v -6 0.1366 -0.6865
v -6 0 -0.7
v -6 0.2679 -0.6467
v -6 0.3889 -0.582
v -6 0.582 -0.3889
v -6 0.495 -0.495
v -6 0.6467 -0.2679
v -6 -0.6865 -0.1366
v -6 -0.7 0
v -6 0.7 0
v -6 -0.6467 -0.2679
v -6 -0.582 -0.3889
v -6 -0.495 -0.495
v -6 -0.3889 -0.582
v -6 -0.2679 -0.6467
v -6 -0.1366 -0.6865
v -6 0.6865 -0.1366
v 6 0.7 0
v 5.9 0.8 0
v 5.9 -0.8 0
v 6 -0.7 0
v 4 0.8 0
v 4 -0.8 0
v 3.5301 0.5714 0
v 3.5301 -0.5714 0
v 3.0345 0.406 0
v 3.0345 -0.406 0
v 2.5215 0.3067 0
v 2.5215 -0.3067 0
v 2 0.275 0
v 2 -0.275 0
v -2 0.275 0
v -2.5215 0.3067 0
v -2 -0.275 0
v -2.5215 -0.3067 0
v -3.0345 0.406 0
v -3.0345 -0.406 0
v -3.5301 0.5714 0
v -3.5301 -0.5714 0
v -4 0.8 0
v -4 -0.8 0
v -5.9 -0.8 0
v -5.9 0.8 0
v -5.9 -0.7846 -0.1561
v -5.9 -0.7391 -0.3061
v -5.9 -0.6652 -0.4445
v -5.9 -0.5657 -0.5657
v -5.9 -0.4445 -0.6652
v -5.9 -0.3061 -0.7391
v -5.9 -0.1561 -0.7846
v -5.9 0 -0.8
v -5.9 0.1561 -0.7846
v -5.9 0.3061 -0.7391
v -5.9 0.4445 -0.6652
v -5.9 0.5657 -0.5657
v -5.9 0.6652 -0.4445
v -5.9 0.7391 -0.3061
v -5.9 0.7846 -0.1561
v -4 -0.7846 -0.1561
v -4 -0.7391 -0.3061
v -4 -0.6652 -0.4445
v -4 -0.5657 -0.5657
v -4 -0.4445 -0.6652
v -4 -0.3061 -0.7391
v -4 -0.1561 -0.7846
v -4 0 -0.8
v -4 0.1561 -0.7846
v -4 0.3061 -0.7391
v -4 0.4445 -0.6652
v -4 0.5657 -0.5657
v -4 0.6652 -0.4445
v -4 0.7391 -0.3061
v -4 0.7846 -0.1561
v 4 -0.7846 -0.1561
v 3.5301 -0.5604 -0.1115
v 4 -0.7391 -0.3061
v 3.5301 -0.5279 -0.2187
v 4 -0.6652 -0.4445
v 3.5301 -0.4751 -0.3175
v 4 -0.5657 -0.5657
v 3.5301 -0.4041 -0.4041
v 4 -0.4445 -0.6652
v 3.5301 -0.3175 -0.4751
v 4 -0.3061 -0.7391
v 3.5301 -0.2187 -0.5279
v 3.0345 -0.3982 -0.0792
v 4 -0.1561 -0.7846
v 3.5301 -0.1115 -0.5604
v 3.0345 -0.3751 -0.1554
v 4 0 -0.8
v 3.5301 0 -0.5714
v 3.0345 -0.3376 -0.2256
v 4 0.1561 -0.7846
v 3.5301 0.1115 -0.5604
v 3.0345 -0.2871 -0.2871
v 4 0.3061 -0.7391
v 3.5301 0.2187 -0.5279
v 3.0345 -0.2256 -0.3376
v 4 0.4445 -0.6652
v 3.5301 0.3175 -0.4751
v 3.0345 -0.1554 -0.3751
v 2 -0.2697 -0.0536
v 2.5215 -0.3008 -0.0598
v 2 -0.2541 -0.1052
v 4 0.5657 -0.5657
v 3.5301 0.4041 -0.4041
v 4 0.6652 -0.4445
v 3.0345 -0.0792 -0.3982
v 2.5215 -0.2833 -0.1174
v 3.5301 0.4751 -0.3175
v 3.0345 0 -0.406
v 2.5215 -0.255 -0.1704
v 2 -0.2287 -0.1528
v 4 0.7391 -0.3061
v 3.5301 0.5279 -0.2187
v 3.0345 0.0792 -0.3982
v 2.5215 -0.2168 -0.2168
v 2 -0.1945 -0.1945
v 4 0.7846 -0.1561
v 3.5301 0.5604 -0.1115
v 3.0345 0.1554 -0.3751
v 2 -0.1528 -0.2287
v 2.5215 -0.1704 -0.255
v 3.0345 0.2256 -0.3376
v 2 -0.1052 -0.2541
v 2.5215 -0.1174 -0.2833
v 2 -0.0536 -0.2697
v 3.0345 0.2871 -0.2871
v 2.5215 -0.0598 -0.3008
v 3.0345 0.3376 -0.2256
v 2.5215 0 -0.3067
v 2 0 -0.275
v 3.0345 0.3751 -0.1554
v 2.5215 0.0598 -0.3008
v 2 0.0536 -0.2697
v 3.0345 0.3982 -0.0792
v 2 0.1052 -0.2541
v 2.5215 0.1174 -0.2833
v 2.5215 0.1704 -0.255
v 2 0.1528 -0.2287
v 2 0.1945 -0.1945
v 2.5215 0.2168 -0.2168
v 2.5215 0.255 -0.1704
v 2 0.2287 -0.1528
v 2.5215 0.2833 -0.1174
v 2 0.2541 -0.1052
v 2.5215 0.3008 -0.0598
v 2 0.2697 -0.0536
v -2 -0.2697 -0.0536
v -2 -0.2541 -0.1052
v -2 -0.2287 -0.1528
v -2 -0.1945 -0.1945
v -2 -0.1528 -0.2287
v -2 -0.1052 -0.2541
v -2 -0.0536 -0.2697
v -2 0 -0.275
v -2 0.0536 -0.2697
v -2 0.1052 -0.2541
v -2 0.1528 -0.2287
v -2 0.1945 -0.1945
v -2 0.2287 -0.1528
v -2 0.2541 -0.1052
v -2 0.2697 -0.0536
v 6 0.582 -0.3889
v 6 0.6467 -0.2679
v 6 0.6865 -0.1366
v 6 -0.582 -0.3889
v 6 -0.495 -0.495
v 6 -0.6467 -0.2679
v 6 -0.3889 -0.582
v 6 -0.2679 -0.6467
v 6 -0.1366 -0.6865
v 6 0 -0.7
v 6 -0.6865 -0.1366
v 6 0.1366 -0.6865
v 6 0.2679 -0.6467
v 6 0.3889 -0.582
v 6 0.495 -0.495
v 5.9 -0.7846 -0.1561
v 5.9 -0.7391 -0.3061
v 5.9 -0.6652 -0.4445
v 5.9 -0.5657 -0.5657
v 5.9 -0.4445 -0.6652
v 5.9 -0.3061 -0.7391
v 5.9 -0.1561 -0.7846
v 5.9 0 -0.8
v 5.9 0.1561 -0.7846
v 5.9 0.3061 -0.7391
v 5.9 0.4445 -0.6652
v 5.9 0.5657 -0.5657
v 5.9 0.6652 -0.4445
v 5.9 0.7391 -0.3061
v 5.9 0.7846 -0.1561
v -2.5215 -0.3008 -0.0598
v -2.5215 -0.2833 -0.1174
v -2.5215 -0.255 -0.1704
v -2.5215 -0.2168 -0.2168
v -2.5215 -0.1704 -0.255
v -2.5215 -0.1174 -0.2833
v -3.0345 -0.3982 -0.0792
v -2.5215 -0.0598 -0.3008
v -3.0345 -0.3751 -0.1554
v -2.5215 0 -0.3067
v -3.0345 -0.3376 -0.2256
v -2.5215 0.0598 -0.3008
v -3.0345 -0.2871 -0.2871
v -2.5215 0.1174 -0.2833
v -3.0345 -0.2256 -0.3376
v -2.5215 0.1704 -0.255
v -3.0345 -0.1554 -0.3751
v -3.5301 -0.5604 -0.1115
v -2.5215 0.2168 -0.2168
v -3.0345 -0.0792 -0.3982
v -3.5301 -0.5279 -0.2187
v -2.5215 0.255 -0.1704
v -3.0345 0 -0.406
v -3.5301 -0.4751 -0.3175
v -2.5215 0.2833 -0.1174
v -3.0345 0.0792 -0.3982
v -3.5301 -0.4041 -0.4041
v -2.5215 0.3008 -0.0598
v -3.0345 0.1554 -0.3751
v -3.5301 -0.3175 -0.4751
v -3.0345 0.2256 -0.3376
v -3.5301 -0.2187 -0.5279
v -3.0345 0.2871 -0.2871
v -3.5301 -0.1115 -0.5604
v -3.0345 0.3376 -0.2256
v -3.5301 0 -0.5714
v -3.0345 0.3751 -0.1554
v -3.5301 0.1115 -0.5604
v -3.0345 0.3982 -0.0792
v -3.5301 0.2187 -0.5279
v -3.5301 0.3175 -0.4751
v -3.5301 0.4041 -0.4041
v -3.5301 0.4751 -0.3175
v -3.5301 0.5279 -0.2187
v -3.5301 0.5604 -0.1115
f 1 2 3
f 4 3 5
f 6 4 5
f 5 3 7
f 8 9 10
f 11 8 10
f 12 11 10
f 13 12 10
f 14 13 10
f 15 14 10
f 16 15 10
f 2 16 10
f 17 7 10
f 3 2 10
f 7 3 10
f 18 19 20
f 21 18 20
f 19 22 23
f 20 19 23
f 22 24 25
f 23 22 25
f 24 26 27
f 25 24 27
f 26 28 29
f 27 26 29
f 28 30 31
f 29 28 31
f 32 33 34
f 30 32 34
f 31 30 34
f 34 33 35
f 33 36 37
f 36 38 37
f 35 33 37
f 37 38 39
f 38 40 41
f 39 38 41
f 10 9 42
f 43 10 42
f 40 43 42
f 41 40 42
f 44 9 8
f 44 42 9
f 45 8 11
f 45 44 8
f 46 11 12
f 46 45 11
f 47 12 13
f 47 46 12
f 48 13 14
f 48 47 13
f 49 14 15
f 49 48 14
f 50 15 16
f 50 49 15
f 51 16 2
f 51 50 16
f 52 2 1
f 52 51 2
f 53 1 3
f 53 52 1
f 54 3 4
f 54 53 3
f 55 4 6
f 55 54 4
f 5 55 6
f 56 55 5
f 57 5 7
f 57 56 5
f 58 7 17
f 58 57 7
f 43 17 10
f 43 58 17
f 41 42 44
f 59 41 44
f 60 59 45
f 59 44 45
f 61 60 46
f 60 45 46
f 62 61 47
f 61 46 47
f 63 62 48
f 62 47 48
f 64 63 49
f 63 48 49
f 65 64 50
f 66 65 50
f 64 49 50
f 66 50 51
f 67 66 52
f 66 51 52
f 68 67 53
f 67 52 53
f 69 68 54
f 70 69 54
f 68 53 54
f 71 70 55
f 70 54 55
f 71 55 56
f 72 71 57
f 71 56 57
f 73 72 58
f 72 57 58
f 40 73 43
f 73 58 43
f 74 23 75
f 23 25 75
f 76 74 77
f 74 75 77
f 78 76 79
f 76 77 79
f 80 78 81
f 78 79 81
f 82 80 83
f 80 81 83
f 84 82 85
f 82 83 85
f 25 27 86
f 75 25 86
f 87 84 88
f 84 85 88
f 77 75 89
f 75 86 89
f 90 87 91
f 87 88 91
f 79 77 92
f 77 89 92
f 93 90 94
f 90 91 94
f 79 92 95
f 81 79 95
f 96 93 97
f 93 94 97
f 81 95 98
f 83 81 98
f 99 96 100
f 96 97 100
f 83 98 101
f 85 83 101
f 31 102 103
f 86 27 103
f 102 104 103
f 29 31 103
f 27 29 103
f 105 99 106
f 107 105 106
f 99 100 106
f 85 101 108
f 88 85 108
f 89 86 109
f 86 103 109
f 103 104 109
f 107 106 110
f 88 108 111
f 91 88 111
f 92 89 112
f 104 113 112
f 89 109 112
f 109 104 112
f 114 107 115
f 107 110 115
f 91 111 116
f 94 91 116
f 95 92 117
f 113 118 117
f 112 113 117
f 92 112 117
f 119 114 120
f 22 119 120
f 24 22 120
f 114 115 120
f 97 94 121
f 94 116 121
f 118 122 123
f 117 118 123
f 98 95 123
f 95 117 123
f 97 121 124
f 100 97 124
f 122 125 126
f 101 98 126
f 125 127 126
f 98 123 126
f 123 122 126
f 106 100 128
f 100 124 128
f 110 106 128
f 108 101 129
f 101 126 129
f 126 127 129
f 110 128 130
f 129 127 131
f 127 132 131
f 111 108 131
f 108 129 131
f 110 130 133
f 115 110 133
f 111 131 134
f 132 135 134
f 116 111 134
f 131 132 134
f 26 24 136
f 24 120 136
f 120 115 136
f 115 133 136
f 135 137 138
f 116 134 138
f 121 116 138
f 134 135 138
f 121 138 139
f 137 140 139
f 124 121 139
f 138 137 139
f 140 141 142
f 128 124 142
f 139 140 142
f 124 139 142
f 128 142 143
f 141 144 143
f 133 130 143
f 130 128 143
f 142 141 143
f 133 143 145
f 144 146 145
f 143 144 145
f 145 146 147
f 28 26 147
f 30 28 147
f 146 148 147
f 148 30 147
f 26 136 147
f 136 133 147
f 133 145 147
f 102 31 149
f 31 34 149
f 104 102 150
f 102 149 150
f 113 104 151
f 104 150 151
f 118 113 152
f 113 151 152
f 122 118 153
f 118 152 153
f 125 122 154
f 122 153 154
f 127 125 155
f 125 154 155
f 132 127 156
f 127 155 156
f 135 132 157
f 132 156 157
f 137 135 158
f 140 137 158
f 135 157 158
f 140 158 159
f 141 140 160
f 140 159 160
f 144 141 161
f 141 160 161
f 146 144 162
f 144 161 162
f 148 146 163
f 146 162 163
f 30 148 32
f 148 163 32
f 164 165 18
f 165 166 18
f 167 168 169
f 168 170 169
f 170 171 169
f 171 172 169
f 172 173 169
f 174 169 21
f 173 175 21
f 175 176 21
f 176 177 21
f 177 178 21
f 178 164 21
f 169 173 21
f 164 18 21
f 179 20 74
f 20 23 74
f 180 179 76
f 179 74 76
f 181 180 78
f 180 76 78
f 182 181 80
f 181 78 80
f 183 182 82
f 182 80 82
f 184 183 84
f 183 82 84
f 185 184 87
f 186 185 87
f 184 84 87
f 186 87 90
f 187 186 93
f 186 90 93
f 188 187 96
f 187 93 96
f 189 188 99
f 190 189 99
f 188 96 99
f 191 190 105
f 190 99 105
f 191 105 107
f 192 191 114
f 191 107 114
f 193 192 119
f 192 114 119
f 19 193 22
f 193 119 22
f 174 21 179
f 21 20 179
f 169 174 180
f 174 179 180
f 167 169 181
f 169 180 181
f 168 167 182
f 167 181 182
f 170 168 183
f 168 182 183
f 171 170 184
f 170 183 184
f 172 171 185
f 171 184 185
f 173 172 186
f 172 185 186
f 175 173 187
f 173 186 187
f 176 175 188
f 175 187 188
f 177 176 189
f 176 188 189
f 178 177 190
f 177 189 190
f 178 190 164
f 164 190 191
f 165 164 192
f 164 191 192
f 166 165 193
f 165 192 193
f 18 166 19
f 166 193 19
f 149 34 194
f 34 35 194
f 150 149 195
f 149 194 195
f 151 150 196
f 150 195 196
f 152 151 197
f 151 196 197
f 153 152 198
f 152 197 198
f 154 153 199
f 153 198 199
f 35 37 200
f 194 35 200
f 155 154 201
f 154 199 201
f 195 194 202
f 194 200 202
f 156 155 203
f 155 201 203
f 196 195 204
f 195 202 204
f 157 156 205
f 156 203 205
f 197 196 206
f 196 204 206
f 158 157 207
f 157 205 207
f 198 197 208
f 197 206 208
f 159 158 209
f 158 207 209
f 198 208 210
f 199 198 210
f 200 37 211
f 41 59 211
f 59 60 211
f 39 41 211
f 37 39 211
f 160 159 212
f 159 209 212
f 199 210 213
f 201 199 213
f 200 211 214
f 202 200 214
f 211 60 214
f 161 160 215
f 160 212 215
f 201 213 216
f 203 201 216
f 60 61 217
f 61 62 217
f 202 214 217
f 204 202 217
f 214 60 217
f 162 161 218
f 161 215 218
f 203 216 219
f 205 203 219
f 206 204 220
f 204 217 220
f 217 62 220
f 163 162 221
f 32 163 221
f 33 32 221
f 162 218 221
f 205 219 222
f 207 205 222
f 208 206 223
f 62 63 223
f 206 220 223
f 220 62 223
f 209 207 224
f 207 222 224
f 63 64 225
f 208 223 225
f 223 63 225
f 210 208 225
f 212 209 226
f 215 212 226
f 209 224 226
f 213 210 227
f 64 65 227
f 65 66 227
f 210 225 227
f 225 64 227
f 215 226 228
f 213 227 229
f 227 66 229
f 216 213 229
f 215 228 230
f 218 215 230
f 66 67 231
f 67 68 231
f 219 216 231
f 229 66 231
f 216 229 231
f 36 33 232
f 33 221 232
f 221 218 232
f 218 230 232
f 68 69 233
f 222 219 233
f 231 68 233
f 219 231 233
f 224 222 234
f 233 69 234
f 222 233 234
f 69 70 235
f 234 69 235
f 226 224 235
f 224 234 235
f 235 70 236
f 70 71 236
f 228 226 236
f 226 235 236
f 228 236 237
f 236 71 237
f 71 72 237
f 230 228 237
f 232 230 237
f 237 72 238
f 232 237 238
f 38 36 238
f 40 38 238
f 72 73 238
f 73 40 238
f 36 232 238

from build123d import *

# Parameters (mm, degrees)
F2_SIZE  = 0.1
F3_W     = 2.394506
F3_H     = 1.124954
F4_DEPTH = 12.001


with BuildPart() as f1:
    # F0 (on Top) → F1 (revolve)
    with BuildSketch(Plane.XY):
        with BuildLine():
            Line((-6, 0.8), (-6, 0))
            Line((-6, 0), (6, 0))
            Line((6, 0), (6, 0.8))
            Line((6, 0.8), (4, 0.8))
            ThreePointArc((4, 0.8), (3.034511, 0.406031), (2, 0.275))
            Line((2, 0.275), (0, 0.275))
            Line((0, 0.275), (-2, 0.275))
            ThreePointArc((-2, 0.275), (-3.034511, 0.406031), (-4, 0.8))
            Line((-4, 0.8), (-6, 0.8))
        make_face()
    revolve(axis=Axis((0, 0, 0), (1, 0, 0)))

    # F2
    f2_edges = [f1.edges().sort_by_distance(p)[0] for p in [
        (-6, -0.8, 0),
        (6, -0.8, 0),
    ]]
    chamfer(f2_edges, length=F2_SIZE)

    # F3 (on face) → F4 (cut, through all)
    with BuildSketch(Plane(origin=(-6, 0, 0), x_dir=(0, -1, 0), z_dir=(-1, 0, 0))):
        with Locations((-0.261201, 0.562477)):
            Rectangle(F3_W, F3_H)
    extrude(amount=-F4_DEPTH, mode=Mode.SUBTRACT)


solid = f1.part
